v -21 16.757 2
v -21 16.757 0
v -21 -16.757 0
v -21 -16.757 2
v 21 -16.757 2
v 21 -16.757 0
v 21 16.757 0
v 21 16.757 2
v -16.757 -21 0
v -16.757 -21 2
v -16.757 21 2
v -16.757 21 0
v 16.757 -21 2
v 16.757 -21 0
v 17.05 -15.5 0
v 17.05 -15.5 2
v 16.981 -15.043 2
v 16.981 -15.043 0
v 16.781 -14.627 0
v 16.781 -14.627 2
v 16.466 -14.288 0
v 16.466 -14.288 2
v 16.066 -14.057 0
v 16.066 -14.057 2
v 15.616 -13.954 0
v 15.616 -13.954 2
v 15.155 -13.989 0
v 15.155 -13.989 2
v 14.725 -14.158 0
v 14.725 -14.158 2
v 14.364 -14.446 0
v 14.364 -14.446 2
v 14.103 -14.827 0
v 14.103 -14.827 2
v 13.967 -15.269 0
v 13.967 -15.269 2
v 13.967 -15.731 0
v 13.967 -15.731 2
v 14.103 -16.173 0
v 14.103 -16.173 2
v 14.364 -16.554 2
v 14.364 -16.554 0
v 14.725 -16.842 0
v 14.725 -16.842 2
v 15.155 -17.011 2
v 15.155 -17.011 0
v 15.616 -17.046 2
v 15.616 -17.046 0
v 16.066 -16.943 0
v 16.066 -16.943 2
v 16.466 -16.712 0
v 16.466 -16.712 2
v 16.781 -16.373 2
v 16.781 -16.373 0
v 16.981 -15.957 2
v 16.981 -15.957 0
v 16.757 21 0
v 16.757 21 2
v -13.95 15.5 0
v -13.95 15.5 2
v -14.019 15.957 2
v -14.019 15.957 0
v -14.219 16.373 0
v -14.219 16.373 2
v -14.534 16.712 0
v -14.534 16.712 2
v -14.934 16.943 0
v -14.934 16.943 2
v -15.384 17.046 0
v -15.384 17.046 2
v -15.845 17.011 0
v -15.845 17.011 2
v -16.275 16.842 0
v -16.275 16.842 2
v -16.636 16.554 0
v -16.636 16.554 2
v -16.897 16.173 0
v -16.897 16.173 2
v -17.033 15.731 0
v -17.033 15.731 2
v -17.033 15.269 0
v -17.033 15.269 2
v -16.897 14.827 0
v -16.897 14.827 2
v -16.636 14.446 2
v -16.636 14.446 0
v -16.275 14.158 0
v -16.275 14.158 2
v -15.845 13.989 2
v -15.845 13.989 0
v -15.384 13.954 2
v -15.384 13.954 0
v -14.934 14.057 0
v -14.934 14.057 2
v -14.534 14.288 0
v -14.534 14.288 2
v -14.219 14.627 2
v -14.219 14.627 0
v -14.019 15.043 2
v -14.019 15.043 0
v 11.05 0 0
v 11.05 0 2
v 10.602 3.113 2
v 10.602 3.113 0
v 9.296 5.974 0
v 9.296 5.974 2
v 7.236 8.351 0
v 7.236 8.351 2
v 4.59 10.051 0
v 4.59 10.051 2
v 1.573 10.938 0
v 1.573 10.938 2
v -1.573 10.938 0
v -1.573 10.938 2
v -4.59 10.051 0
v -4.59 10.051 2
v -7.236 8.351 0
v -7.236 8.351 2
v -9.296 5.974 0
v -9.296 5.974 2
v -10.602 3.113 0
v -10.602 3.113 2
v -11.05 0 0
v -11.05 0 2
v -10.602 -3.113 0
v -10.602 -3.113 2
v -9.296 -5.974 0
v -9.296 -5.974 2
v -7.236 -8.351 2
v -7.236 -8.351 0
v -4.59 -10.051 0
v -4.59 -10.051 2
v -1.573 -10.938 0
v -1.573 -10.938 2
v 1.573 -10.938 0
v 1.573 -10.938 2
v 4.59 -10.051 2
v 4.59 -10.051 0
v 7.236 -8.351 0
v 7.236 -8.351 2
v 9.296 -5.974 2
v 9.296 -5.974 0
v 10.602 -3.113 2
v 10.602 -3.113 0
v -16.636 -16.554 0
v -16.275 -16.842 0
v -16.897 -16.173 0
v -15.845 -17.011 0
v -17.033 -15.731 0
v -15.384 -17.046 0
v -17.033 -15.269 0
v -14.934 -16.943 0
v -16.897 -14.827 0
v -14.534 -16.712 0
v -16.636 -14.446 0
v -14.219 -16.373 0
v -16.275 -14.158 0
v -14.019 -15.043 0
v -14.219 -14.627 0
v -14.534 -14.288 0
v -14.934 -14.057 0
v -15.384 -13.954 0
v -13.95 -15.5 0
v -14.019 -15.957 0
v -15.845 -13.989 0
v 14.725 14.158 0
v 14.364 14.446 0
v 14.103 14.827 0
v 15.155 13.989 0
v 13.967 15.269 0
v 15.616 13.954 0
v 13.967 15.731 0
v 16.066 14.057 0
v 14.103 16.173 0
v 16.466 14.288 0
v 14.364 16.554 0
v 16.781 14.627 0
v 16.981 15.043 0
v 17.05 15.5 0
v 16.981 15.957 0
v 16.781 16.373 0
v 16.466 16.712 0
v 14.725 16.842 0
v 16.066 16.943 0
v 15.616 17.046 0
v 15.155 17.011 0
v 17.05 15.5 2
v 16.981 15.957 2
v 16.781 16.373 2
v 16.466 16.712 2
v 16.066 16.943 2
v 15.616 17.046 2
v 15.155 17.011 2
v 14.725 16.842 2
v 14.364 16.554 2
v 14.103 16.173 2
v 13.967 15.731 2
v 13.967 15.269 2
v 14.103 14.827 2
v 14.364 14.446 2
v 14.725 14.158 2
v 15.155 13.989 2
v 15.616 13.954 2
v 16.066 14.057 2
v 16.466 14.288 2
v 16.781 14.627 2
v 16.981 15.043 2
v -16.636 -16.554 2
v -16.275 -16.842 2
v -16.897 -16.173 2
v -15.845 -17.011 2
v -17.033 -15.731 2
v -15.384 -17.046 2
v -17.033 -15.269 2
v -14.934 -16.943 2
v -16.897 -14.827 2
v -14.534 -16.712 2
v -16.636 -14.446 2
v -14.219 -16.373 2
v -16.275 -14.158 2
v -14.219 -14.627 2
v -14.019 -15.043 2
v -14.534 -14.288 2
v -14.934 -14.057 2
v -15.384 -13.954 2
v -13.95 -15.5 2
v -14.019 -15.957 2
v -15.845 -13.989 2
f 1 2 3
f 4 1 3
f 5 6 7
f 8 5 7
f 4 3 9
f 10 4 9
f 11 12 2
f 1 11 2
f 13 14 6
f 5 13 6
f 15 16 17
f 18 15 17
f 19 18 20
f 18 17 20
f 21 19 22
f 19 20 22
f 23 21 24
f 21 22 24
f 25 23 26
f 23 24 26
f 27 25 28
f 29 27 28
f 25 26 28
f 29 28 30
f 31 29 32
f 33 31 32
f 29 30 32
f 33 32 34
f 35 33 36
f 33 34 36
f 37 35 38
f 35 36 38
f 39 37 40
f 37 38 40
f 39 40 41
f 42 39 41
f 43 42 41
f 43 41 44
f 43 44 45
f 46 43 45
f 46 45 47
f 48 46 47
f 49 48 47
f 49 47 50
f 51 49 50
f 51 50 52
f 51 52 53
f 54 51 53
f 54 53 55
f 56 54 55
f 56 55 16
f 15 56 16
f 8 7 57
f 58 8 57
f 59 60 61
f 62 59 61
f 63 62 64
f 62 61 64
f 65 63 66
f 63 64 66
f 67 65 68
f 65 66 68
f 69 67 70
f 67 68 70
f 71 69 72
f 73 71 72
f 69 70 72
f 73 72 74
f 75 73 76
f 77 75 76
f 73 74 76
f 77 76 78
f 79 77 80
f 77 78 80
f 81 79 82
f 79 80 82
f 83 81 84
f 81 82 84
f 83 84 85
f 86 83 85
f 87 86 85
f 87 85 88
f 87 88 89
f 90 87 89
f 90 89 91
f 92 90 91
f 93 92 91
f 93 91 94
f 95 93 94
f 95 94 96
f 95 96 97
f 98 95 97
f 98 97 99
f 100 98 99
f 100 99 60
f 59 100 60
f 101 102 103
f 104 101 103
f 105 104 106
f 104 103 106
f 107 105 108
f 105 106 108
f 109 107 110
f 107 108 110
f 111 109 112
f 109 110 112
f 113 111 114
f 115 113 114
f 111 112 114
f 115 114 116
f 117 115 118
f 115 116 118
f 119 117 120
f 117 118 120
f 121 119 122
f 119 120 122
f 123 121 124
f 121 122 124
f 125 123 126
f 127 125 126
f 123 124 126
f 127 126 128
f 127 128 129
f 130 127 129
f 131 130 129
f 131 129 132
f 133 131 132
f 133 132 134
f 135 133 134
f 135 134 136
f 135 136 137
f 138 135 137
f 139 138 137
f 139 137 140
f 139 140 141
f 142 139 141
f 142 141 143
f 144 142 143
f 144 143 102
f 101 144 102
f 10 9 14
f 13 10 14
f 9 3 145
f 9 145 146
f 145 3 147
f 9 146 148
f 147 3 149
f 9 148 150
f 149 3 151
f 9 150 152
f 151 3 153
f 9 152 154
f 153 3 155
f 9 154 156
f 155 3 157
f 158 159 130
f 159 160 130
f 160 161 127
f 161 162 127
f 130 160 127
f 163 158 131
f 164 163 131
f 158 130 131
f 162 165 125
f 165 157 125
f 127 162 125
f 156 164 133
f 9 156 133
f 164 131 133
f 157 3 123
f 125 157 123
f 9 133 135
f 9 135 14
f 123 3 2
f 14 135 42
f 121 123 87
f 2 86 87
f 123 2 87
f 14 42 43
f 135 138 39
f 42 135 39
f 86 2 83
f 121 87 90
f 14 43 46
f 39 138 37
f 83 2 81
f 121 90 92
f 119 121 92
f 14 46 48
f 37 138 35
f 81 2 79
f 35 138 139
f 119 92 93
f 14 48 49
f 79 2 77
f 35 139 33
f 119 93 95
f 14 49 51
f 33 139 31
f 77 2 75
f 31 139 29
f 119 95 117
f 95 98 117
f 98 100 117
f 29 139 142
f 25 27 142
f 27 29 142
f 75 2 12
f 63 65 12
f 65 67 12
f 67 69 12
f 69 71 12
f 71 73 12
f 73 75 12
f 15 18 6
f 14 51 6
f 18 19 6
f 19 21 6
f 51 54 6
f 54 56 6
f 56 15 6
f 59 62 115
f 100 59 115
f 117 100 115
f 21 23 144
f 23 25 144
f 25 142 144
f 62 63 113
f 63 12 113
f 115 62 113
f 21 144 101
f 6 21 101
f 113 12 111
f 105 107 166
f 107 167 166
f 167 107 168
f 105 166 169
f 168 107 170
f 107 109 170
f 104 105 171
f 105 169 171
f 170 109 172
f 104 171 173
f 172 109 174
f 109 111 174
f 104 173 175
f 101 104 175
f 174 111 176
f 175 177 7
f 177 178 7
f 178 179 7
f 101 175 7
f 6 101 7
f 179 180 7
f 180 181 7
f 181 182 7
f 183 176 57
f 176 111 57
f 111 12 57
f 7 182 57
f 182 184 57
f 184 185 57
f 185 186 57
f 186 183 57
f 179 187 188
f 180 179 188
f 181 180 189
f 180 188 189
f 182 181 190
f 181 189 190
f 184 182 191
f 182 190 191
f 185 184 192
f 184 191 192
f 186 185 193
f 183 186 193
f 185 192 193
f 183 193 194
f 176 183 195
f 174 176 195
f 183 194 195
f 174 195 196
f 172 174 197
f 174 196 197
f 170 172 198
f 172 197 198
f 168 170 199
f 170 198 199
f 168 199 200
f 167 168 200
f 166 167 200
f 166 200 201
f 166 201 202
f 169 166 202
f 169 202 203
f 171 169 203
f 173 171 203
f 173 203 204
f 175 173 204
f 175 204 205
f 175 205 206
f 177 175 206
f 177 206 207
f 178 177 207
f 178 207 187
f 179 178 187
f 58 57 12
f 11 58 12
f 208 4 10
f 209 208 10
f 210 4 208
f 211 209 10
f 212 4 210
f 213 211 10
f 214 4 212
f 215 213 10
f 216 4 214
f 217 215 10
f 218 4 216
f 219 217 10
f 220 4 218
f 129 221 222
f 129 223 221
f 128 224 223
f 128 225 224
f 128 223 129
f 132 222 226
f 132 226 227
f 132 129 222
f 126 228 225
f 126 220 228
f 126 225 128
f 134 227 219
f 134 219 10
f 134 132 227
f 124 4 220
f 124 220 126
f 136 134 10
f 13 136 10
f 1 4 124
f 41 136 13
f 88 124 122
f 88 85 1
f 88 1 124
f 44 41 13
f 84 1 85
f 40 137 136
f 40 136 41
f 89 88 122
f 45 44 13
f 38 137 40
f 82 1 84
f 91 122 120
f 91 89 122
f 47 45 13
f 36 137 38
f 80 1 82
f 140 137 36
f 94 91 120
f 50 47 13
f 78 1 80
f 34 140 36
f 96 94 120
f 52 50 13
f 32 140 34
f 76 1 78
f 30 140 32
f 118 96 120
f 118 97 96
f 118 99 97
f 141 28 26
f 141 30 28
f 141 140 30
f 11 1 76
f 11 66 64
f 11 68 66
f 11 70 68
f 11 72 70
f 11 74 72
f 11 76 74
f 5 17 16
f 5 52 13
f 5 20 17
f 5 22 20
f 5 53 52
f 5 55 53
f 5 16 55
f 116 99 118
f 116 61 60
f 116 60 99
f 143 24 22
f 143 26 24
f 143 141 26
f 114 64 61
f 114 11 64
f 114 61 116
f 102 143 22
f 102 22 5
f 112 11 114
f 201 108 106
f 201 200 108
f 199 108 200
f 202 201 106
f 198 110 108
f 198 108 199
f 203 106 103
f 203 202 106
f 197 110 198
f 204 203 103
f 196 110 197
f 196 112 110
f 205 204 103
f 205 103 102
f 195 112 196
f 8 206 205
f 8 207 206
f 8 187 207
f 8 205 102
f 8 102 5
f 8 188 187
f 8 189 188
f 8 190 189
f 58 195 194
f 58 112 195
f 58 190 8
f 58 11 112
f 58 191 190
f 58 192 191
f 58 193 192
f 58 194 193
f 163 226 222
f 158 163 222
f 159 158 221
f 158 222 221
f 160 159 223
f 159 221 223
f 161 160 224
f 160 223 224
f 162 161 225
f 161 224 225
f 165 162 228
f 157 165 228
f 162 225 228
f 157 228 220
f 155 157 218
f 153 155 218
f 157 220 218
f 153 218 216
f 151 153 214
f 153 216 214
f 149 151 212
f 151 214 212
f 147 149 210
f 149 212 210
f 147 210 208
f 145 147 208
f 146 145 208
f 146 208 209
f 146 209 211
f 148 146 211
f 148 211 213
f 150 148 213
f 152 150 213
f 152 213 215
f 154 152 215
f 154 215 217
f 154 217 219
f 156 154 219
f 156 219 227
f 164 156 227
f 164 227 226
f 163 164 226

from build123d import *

# Parameters (mm, degrees)
PAD_DEPTH     = 2
SKETCH001_R   = 1.55
SKETCH001_R_2 = 11.05
POCKET_DEPTH  = 5


with BuildPart() as part:
    # Sketch → Pad (new body)
    with BuildSketch(Plane.XY):
        Polygon((21, -16.757359), (21, 16.757359), (16.757359, 21), (-16.757359, 21), (-21, 16.757359), (-21, -16.757359), (-16.757359, -21), (16.757359, -21), align=None)
    extrude(amount=PAD_DEPTH)

    # Sketch001 (on Face10 of Pad) → Pocket (cut)
    with BuildSketch(Plane.XY.offset(2)):
        with Locations((-15.5, 15.5)):
            Circle(SKETCH001_R)
        with Locations((15.5, 15.5)):
            Circle(SKETCH001_R)
        with Locations((15.5, -15.5)):
            Circle(SKETCH001_R)
        with Locations((-15.5, -15.5)):
            Circle(SKETCH001_R)
        Circle(SKETCH001_R_2)
    extrude(amount=-POCKET_DEPTH, mode=Mode.SUBTRACT)


solid = part.part
